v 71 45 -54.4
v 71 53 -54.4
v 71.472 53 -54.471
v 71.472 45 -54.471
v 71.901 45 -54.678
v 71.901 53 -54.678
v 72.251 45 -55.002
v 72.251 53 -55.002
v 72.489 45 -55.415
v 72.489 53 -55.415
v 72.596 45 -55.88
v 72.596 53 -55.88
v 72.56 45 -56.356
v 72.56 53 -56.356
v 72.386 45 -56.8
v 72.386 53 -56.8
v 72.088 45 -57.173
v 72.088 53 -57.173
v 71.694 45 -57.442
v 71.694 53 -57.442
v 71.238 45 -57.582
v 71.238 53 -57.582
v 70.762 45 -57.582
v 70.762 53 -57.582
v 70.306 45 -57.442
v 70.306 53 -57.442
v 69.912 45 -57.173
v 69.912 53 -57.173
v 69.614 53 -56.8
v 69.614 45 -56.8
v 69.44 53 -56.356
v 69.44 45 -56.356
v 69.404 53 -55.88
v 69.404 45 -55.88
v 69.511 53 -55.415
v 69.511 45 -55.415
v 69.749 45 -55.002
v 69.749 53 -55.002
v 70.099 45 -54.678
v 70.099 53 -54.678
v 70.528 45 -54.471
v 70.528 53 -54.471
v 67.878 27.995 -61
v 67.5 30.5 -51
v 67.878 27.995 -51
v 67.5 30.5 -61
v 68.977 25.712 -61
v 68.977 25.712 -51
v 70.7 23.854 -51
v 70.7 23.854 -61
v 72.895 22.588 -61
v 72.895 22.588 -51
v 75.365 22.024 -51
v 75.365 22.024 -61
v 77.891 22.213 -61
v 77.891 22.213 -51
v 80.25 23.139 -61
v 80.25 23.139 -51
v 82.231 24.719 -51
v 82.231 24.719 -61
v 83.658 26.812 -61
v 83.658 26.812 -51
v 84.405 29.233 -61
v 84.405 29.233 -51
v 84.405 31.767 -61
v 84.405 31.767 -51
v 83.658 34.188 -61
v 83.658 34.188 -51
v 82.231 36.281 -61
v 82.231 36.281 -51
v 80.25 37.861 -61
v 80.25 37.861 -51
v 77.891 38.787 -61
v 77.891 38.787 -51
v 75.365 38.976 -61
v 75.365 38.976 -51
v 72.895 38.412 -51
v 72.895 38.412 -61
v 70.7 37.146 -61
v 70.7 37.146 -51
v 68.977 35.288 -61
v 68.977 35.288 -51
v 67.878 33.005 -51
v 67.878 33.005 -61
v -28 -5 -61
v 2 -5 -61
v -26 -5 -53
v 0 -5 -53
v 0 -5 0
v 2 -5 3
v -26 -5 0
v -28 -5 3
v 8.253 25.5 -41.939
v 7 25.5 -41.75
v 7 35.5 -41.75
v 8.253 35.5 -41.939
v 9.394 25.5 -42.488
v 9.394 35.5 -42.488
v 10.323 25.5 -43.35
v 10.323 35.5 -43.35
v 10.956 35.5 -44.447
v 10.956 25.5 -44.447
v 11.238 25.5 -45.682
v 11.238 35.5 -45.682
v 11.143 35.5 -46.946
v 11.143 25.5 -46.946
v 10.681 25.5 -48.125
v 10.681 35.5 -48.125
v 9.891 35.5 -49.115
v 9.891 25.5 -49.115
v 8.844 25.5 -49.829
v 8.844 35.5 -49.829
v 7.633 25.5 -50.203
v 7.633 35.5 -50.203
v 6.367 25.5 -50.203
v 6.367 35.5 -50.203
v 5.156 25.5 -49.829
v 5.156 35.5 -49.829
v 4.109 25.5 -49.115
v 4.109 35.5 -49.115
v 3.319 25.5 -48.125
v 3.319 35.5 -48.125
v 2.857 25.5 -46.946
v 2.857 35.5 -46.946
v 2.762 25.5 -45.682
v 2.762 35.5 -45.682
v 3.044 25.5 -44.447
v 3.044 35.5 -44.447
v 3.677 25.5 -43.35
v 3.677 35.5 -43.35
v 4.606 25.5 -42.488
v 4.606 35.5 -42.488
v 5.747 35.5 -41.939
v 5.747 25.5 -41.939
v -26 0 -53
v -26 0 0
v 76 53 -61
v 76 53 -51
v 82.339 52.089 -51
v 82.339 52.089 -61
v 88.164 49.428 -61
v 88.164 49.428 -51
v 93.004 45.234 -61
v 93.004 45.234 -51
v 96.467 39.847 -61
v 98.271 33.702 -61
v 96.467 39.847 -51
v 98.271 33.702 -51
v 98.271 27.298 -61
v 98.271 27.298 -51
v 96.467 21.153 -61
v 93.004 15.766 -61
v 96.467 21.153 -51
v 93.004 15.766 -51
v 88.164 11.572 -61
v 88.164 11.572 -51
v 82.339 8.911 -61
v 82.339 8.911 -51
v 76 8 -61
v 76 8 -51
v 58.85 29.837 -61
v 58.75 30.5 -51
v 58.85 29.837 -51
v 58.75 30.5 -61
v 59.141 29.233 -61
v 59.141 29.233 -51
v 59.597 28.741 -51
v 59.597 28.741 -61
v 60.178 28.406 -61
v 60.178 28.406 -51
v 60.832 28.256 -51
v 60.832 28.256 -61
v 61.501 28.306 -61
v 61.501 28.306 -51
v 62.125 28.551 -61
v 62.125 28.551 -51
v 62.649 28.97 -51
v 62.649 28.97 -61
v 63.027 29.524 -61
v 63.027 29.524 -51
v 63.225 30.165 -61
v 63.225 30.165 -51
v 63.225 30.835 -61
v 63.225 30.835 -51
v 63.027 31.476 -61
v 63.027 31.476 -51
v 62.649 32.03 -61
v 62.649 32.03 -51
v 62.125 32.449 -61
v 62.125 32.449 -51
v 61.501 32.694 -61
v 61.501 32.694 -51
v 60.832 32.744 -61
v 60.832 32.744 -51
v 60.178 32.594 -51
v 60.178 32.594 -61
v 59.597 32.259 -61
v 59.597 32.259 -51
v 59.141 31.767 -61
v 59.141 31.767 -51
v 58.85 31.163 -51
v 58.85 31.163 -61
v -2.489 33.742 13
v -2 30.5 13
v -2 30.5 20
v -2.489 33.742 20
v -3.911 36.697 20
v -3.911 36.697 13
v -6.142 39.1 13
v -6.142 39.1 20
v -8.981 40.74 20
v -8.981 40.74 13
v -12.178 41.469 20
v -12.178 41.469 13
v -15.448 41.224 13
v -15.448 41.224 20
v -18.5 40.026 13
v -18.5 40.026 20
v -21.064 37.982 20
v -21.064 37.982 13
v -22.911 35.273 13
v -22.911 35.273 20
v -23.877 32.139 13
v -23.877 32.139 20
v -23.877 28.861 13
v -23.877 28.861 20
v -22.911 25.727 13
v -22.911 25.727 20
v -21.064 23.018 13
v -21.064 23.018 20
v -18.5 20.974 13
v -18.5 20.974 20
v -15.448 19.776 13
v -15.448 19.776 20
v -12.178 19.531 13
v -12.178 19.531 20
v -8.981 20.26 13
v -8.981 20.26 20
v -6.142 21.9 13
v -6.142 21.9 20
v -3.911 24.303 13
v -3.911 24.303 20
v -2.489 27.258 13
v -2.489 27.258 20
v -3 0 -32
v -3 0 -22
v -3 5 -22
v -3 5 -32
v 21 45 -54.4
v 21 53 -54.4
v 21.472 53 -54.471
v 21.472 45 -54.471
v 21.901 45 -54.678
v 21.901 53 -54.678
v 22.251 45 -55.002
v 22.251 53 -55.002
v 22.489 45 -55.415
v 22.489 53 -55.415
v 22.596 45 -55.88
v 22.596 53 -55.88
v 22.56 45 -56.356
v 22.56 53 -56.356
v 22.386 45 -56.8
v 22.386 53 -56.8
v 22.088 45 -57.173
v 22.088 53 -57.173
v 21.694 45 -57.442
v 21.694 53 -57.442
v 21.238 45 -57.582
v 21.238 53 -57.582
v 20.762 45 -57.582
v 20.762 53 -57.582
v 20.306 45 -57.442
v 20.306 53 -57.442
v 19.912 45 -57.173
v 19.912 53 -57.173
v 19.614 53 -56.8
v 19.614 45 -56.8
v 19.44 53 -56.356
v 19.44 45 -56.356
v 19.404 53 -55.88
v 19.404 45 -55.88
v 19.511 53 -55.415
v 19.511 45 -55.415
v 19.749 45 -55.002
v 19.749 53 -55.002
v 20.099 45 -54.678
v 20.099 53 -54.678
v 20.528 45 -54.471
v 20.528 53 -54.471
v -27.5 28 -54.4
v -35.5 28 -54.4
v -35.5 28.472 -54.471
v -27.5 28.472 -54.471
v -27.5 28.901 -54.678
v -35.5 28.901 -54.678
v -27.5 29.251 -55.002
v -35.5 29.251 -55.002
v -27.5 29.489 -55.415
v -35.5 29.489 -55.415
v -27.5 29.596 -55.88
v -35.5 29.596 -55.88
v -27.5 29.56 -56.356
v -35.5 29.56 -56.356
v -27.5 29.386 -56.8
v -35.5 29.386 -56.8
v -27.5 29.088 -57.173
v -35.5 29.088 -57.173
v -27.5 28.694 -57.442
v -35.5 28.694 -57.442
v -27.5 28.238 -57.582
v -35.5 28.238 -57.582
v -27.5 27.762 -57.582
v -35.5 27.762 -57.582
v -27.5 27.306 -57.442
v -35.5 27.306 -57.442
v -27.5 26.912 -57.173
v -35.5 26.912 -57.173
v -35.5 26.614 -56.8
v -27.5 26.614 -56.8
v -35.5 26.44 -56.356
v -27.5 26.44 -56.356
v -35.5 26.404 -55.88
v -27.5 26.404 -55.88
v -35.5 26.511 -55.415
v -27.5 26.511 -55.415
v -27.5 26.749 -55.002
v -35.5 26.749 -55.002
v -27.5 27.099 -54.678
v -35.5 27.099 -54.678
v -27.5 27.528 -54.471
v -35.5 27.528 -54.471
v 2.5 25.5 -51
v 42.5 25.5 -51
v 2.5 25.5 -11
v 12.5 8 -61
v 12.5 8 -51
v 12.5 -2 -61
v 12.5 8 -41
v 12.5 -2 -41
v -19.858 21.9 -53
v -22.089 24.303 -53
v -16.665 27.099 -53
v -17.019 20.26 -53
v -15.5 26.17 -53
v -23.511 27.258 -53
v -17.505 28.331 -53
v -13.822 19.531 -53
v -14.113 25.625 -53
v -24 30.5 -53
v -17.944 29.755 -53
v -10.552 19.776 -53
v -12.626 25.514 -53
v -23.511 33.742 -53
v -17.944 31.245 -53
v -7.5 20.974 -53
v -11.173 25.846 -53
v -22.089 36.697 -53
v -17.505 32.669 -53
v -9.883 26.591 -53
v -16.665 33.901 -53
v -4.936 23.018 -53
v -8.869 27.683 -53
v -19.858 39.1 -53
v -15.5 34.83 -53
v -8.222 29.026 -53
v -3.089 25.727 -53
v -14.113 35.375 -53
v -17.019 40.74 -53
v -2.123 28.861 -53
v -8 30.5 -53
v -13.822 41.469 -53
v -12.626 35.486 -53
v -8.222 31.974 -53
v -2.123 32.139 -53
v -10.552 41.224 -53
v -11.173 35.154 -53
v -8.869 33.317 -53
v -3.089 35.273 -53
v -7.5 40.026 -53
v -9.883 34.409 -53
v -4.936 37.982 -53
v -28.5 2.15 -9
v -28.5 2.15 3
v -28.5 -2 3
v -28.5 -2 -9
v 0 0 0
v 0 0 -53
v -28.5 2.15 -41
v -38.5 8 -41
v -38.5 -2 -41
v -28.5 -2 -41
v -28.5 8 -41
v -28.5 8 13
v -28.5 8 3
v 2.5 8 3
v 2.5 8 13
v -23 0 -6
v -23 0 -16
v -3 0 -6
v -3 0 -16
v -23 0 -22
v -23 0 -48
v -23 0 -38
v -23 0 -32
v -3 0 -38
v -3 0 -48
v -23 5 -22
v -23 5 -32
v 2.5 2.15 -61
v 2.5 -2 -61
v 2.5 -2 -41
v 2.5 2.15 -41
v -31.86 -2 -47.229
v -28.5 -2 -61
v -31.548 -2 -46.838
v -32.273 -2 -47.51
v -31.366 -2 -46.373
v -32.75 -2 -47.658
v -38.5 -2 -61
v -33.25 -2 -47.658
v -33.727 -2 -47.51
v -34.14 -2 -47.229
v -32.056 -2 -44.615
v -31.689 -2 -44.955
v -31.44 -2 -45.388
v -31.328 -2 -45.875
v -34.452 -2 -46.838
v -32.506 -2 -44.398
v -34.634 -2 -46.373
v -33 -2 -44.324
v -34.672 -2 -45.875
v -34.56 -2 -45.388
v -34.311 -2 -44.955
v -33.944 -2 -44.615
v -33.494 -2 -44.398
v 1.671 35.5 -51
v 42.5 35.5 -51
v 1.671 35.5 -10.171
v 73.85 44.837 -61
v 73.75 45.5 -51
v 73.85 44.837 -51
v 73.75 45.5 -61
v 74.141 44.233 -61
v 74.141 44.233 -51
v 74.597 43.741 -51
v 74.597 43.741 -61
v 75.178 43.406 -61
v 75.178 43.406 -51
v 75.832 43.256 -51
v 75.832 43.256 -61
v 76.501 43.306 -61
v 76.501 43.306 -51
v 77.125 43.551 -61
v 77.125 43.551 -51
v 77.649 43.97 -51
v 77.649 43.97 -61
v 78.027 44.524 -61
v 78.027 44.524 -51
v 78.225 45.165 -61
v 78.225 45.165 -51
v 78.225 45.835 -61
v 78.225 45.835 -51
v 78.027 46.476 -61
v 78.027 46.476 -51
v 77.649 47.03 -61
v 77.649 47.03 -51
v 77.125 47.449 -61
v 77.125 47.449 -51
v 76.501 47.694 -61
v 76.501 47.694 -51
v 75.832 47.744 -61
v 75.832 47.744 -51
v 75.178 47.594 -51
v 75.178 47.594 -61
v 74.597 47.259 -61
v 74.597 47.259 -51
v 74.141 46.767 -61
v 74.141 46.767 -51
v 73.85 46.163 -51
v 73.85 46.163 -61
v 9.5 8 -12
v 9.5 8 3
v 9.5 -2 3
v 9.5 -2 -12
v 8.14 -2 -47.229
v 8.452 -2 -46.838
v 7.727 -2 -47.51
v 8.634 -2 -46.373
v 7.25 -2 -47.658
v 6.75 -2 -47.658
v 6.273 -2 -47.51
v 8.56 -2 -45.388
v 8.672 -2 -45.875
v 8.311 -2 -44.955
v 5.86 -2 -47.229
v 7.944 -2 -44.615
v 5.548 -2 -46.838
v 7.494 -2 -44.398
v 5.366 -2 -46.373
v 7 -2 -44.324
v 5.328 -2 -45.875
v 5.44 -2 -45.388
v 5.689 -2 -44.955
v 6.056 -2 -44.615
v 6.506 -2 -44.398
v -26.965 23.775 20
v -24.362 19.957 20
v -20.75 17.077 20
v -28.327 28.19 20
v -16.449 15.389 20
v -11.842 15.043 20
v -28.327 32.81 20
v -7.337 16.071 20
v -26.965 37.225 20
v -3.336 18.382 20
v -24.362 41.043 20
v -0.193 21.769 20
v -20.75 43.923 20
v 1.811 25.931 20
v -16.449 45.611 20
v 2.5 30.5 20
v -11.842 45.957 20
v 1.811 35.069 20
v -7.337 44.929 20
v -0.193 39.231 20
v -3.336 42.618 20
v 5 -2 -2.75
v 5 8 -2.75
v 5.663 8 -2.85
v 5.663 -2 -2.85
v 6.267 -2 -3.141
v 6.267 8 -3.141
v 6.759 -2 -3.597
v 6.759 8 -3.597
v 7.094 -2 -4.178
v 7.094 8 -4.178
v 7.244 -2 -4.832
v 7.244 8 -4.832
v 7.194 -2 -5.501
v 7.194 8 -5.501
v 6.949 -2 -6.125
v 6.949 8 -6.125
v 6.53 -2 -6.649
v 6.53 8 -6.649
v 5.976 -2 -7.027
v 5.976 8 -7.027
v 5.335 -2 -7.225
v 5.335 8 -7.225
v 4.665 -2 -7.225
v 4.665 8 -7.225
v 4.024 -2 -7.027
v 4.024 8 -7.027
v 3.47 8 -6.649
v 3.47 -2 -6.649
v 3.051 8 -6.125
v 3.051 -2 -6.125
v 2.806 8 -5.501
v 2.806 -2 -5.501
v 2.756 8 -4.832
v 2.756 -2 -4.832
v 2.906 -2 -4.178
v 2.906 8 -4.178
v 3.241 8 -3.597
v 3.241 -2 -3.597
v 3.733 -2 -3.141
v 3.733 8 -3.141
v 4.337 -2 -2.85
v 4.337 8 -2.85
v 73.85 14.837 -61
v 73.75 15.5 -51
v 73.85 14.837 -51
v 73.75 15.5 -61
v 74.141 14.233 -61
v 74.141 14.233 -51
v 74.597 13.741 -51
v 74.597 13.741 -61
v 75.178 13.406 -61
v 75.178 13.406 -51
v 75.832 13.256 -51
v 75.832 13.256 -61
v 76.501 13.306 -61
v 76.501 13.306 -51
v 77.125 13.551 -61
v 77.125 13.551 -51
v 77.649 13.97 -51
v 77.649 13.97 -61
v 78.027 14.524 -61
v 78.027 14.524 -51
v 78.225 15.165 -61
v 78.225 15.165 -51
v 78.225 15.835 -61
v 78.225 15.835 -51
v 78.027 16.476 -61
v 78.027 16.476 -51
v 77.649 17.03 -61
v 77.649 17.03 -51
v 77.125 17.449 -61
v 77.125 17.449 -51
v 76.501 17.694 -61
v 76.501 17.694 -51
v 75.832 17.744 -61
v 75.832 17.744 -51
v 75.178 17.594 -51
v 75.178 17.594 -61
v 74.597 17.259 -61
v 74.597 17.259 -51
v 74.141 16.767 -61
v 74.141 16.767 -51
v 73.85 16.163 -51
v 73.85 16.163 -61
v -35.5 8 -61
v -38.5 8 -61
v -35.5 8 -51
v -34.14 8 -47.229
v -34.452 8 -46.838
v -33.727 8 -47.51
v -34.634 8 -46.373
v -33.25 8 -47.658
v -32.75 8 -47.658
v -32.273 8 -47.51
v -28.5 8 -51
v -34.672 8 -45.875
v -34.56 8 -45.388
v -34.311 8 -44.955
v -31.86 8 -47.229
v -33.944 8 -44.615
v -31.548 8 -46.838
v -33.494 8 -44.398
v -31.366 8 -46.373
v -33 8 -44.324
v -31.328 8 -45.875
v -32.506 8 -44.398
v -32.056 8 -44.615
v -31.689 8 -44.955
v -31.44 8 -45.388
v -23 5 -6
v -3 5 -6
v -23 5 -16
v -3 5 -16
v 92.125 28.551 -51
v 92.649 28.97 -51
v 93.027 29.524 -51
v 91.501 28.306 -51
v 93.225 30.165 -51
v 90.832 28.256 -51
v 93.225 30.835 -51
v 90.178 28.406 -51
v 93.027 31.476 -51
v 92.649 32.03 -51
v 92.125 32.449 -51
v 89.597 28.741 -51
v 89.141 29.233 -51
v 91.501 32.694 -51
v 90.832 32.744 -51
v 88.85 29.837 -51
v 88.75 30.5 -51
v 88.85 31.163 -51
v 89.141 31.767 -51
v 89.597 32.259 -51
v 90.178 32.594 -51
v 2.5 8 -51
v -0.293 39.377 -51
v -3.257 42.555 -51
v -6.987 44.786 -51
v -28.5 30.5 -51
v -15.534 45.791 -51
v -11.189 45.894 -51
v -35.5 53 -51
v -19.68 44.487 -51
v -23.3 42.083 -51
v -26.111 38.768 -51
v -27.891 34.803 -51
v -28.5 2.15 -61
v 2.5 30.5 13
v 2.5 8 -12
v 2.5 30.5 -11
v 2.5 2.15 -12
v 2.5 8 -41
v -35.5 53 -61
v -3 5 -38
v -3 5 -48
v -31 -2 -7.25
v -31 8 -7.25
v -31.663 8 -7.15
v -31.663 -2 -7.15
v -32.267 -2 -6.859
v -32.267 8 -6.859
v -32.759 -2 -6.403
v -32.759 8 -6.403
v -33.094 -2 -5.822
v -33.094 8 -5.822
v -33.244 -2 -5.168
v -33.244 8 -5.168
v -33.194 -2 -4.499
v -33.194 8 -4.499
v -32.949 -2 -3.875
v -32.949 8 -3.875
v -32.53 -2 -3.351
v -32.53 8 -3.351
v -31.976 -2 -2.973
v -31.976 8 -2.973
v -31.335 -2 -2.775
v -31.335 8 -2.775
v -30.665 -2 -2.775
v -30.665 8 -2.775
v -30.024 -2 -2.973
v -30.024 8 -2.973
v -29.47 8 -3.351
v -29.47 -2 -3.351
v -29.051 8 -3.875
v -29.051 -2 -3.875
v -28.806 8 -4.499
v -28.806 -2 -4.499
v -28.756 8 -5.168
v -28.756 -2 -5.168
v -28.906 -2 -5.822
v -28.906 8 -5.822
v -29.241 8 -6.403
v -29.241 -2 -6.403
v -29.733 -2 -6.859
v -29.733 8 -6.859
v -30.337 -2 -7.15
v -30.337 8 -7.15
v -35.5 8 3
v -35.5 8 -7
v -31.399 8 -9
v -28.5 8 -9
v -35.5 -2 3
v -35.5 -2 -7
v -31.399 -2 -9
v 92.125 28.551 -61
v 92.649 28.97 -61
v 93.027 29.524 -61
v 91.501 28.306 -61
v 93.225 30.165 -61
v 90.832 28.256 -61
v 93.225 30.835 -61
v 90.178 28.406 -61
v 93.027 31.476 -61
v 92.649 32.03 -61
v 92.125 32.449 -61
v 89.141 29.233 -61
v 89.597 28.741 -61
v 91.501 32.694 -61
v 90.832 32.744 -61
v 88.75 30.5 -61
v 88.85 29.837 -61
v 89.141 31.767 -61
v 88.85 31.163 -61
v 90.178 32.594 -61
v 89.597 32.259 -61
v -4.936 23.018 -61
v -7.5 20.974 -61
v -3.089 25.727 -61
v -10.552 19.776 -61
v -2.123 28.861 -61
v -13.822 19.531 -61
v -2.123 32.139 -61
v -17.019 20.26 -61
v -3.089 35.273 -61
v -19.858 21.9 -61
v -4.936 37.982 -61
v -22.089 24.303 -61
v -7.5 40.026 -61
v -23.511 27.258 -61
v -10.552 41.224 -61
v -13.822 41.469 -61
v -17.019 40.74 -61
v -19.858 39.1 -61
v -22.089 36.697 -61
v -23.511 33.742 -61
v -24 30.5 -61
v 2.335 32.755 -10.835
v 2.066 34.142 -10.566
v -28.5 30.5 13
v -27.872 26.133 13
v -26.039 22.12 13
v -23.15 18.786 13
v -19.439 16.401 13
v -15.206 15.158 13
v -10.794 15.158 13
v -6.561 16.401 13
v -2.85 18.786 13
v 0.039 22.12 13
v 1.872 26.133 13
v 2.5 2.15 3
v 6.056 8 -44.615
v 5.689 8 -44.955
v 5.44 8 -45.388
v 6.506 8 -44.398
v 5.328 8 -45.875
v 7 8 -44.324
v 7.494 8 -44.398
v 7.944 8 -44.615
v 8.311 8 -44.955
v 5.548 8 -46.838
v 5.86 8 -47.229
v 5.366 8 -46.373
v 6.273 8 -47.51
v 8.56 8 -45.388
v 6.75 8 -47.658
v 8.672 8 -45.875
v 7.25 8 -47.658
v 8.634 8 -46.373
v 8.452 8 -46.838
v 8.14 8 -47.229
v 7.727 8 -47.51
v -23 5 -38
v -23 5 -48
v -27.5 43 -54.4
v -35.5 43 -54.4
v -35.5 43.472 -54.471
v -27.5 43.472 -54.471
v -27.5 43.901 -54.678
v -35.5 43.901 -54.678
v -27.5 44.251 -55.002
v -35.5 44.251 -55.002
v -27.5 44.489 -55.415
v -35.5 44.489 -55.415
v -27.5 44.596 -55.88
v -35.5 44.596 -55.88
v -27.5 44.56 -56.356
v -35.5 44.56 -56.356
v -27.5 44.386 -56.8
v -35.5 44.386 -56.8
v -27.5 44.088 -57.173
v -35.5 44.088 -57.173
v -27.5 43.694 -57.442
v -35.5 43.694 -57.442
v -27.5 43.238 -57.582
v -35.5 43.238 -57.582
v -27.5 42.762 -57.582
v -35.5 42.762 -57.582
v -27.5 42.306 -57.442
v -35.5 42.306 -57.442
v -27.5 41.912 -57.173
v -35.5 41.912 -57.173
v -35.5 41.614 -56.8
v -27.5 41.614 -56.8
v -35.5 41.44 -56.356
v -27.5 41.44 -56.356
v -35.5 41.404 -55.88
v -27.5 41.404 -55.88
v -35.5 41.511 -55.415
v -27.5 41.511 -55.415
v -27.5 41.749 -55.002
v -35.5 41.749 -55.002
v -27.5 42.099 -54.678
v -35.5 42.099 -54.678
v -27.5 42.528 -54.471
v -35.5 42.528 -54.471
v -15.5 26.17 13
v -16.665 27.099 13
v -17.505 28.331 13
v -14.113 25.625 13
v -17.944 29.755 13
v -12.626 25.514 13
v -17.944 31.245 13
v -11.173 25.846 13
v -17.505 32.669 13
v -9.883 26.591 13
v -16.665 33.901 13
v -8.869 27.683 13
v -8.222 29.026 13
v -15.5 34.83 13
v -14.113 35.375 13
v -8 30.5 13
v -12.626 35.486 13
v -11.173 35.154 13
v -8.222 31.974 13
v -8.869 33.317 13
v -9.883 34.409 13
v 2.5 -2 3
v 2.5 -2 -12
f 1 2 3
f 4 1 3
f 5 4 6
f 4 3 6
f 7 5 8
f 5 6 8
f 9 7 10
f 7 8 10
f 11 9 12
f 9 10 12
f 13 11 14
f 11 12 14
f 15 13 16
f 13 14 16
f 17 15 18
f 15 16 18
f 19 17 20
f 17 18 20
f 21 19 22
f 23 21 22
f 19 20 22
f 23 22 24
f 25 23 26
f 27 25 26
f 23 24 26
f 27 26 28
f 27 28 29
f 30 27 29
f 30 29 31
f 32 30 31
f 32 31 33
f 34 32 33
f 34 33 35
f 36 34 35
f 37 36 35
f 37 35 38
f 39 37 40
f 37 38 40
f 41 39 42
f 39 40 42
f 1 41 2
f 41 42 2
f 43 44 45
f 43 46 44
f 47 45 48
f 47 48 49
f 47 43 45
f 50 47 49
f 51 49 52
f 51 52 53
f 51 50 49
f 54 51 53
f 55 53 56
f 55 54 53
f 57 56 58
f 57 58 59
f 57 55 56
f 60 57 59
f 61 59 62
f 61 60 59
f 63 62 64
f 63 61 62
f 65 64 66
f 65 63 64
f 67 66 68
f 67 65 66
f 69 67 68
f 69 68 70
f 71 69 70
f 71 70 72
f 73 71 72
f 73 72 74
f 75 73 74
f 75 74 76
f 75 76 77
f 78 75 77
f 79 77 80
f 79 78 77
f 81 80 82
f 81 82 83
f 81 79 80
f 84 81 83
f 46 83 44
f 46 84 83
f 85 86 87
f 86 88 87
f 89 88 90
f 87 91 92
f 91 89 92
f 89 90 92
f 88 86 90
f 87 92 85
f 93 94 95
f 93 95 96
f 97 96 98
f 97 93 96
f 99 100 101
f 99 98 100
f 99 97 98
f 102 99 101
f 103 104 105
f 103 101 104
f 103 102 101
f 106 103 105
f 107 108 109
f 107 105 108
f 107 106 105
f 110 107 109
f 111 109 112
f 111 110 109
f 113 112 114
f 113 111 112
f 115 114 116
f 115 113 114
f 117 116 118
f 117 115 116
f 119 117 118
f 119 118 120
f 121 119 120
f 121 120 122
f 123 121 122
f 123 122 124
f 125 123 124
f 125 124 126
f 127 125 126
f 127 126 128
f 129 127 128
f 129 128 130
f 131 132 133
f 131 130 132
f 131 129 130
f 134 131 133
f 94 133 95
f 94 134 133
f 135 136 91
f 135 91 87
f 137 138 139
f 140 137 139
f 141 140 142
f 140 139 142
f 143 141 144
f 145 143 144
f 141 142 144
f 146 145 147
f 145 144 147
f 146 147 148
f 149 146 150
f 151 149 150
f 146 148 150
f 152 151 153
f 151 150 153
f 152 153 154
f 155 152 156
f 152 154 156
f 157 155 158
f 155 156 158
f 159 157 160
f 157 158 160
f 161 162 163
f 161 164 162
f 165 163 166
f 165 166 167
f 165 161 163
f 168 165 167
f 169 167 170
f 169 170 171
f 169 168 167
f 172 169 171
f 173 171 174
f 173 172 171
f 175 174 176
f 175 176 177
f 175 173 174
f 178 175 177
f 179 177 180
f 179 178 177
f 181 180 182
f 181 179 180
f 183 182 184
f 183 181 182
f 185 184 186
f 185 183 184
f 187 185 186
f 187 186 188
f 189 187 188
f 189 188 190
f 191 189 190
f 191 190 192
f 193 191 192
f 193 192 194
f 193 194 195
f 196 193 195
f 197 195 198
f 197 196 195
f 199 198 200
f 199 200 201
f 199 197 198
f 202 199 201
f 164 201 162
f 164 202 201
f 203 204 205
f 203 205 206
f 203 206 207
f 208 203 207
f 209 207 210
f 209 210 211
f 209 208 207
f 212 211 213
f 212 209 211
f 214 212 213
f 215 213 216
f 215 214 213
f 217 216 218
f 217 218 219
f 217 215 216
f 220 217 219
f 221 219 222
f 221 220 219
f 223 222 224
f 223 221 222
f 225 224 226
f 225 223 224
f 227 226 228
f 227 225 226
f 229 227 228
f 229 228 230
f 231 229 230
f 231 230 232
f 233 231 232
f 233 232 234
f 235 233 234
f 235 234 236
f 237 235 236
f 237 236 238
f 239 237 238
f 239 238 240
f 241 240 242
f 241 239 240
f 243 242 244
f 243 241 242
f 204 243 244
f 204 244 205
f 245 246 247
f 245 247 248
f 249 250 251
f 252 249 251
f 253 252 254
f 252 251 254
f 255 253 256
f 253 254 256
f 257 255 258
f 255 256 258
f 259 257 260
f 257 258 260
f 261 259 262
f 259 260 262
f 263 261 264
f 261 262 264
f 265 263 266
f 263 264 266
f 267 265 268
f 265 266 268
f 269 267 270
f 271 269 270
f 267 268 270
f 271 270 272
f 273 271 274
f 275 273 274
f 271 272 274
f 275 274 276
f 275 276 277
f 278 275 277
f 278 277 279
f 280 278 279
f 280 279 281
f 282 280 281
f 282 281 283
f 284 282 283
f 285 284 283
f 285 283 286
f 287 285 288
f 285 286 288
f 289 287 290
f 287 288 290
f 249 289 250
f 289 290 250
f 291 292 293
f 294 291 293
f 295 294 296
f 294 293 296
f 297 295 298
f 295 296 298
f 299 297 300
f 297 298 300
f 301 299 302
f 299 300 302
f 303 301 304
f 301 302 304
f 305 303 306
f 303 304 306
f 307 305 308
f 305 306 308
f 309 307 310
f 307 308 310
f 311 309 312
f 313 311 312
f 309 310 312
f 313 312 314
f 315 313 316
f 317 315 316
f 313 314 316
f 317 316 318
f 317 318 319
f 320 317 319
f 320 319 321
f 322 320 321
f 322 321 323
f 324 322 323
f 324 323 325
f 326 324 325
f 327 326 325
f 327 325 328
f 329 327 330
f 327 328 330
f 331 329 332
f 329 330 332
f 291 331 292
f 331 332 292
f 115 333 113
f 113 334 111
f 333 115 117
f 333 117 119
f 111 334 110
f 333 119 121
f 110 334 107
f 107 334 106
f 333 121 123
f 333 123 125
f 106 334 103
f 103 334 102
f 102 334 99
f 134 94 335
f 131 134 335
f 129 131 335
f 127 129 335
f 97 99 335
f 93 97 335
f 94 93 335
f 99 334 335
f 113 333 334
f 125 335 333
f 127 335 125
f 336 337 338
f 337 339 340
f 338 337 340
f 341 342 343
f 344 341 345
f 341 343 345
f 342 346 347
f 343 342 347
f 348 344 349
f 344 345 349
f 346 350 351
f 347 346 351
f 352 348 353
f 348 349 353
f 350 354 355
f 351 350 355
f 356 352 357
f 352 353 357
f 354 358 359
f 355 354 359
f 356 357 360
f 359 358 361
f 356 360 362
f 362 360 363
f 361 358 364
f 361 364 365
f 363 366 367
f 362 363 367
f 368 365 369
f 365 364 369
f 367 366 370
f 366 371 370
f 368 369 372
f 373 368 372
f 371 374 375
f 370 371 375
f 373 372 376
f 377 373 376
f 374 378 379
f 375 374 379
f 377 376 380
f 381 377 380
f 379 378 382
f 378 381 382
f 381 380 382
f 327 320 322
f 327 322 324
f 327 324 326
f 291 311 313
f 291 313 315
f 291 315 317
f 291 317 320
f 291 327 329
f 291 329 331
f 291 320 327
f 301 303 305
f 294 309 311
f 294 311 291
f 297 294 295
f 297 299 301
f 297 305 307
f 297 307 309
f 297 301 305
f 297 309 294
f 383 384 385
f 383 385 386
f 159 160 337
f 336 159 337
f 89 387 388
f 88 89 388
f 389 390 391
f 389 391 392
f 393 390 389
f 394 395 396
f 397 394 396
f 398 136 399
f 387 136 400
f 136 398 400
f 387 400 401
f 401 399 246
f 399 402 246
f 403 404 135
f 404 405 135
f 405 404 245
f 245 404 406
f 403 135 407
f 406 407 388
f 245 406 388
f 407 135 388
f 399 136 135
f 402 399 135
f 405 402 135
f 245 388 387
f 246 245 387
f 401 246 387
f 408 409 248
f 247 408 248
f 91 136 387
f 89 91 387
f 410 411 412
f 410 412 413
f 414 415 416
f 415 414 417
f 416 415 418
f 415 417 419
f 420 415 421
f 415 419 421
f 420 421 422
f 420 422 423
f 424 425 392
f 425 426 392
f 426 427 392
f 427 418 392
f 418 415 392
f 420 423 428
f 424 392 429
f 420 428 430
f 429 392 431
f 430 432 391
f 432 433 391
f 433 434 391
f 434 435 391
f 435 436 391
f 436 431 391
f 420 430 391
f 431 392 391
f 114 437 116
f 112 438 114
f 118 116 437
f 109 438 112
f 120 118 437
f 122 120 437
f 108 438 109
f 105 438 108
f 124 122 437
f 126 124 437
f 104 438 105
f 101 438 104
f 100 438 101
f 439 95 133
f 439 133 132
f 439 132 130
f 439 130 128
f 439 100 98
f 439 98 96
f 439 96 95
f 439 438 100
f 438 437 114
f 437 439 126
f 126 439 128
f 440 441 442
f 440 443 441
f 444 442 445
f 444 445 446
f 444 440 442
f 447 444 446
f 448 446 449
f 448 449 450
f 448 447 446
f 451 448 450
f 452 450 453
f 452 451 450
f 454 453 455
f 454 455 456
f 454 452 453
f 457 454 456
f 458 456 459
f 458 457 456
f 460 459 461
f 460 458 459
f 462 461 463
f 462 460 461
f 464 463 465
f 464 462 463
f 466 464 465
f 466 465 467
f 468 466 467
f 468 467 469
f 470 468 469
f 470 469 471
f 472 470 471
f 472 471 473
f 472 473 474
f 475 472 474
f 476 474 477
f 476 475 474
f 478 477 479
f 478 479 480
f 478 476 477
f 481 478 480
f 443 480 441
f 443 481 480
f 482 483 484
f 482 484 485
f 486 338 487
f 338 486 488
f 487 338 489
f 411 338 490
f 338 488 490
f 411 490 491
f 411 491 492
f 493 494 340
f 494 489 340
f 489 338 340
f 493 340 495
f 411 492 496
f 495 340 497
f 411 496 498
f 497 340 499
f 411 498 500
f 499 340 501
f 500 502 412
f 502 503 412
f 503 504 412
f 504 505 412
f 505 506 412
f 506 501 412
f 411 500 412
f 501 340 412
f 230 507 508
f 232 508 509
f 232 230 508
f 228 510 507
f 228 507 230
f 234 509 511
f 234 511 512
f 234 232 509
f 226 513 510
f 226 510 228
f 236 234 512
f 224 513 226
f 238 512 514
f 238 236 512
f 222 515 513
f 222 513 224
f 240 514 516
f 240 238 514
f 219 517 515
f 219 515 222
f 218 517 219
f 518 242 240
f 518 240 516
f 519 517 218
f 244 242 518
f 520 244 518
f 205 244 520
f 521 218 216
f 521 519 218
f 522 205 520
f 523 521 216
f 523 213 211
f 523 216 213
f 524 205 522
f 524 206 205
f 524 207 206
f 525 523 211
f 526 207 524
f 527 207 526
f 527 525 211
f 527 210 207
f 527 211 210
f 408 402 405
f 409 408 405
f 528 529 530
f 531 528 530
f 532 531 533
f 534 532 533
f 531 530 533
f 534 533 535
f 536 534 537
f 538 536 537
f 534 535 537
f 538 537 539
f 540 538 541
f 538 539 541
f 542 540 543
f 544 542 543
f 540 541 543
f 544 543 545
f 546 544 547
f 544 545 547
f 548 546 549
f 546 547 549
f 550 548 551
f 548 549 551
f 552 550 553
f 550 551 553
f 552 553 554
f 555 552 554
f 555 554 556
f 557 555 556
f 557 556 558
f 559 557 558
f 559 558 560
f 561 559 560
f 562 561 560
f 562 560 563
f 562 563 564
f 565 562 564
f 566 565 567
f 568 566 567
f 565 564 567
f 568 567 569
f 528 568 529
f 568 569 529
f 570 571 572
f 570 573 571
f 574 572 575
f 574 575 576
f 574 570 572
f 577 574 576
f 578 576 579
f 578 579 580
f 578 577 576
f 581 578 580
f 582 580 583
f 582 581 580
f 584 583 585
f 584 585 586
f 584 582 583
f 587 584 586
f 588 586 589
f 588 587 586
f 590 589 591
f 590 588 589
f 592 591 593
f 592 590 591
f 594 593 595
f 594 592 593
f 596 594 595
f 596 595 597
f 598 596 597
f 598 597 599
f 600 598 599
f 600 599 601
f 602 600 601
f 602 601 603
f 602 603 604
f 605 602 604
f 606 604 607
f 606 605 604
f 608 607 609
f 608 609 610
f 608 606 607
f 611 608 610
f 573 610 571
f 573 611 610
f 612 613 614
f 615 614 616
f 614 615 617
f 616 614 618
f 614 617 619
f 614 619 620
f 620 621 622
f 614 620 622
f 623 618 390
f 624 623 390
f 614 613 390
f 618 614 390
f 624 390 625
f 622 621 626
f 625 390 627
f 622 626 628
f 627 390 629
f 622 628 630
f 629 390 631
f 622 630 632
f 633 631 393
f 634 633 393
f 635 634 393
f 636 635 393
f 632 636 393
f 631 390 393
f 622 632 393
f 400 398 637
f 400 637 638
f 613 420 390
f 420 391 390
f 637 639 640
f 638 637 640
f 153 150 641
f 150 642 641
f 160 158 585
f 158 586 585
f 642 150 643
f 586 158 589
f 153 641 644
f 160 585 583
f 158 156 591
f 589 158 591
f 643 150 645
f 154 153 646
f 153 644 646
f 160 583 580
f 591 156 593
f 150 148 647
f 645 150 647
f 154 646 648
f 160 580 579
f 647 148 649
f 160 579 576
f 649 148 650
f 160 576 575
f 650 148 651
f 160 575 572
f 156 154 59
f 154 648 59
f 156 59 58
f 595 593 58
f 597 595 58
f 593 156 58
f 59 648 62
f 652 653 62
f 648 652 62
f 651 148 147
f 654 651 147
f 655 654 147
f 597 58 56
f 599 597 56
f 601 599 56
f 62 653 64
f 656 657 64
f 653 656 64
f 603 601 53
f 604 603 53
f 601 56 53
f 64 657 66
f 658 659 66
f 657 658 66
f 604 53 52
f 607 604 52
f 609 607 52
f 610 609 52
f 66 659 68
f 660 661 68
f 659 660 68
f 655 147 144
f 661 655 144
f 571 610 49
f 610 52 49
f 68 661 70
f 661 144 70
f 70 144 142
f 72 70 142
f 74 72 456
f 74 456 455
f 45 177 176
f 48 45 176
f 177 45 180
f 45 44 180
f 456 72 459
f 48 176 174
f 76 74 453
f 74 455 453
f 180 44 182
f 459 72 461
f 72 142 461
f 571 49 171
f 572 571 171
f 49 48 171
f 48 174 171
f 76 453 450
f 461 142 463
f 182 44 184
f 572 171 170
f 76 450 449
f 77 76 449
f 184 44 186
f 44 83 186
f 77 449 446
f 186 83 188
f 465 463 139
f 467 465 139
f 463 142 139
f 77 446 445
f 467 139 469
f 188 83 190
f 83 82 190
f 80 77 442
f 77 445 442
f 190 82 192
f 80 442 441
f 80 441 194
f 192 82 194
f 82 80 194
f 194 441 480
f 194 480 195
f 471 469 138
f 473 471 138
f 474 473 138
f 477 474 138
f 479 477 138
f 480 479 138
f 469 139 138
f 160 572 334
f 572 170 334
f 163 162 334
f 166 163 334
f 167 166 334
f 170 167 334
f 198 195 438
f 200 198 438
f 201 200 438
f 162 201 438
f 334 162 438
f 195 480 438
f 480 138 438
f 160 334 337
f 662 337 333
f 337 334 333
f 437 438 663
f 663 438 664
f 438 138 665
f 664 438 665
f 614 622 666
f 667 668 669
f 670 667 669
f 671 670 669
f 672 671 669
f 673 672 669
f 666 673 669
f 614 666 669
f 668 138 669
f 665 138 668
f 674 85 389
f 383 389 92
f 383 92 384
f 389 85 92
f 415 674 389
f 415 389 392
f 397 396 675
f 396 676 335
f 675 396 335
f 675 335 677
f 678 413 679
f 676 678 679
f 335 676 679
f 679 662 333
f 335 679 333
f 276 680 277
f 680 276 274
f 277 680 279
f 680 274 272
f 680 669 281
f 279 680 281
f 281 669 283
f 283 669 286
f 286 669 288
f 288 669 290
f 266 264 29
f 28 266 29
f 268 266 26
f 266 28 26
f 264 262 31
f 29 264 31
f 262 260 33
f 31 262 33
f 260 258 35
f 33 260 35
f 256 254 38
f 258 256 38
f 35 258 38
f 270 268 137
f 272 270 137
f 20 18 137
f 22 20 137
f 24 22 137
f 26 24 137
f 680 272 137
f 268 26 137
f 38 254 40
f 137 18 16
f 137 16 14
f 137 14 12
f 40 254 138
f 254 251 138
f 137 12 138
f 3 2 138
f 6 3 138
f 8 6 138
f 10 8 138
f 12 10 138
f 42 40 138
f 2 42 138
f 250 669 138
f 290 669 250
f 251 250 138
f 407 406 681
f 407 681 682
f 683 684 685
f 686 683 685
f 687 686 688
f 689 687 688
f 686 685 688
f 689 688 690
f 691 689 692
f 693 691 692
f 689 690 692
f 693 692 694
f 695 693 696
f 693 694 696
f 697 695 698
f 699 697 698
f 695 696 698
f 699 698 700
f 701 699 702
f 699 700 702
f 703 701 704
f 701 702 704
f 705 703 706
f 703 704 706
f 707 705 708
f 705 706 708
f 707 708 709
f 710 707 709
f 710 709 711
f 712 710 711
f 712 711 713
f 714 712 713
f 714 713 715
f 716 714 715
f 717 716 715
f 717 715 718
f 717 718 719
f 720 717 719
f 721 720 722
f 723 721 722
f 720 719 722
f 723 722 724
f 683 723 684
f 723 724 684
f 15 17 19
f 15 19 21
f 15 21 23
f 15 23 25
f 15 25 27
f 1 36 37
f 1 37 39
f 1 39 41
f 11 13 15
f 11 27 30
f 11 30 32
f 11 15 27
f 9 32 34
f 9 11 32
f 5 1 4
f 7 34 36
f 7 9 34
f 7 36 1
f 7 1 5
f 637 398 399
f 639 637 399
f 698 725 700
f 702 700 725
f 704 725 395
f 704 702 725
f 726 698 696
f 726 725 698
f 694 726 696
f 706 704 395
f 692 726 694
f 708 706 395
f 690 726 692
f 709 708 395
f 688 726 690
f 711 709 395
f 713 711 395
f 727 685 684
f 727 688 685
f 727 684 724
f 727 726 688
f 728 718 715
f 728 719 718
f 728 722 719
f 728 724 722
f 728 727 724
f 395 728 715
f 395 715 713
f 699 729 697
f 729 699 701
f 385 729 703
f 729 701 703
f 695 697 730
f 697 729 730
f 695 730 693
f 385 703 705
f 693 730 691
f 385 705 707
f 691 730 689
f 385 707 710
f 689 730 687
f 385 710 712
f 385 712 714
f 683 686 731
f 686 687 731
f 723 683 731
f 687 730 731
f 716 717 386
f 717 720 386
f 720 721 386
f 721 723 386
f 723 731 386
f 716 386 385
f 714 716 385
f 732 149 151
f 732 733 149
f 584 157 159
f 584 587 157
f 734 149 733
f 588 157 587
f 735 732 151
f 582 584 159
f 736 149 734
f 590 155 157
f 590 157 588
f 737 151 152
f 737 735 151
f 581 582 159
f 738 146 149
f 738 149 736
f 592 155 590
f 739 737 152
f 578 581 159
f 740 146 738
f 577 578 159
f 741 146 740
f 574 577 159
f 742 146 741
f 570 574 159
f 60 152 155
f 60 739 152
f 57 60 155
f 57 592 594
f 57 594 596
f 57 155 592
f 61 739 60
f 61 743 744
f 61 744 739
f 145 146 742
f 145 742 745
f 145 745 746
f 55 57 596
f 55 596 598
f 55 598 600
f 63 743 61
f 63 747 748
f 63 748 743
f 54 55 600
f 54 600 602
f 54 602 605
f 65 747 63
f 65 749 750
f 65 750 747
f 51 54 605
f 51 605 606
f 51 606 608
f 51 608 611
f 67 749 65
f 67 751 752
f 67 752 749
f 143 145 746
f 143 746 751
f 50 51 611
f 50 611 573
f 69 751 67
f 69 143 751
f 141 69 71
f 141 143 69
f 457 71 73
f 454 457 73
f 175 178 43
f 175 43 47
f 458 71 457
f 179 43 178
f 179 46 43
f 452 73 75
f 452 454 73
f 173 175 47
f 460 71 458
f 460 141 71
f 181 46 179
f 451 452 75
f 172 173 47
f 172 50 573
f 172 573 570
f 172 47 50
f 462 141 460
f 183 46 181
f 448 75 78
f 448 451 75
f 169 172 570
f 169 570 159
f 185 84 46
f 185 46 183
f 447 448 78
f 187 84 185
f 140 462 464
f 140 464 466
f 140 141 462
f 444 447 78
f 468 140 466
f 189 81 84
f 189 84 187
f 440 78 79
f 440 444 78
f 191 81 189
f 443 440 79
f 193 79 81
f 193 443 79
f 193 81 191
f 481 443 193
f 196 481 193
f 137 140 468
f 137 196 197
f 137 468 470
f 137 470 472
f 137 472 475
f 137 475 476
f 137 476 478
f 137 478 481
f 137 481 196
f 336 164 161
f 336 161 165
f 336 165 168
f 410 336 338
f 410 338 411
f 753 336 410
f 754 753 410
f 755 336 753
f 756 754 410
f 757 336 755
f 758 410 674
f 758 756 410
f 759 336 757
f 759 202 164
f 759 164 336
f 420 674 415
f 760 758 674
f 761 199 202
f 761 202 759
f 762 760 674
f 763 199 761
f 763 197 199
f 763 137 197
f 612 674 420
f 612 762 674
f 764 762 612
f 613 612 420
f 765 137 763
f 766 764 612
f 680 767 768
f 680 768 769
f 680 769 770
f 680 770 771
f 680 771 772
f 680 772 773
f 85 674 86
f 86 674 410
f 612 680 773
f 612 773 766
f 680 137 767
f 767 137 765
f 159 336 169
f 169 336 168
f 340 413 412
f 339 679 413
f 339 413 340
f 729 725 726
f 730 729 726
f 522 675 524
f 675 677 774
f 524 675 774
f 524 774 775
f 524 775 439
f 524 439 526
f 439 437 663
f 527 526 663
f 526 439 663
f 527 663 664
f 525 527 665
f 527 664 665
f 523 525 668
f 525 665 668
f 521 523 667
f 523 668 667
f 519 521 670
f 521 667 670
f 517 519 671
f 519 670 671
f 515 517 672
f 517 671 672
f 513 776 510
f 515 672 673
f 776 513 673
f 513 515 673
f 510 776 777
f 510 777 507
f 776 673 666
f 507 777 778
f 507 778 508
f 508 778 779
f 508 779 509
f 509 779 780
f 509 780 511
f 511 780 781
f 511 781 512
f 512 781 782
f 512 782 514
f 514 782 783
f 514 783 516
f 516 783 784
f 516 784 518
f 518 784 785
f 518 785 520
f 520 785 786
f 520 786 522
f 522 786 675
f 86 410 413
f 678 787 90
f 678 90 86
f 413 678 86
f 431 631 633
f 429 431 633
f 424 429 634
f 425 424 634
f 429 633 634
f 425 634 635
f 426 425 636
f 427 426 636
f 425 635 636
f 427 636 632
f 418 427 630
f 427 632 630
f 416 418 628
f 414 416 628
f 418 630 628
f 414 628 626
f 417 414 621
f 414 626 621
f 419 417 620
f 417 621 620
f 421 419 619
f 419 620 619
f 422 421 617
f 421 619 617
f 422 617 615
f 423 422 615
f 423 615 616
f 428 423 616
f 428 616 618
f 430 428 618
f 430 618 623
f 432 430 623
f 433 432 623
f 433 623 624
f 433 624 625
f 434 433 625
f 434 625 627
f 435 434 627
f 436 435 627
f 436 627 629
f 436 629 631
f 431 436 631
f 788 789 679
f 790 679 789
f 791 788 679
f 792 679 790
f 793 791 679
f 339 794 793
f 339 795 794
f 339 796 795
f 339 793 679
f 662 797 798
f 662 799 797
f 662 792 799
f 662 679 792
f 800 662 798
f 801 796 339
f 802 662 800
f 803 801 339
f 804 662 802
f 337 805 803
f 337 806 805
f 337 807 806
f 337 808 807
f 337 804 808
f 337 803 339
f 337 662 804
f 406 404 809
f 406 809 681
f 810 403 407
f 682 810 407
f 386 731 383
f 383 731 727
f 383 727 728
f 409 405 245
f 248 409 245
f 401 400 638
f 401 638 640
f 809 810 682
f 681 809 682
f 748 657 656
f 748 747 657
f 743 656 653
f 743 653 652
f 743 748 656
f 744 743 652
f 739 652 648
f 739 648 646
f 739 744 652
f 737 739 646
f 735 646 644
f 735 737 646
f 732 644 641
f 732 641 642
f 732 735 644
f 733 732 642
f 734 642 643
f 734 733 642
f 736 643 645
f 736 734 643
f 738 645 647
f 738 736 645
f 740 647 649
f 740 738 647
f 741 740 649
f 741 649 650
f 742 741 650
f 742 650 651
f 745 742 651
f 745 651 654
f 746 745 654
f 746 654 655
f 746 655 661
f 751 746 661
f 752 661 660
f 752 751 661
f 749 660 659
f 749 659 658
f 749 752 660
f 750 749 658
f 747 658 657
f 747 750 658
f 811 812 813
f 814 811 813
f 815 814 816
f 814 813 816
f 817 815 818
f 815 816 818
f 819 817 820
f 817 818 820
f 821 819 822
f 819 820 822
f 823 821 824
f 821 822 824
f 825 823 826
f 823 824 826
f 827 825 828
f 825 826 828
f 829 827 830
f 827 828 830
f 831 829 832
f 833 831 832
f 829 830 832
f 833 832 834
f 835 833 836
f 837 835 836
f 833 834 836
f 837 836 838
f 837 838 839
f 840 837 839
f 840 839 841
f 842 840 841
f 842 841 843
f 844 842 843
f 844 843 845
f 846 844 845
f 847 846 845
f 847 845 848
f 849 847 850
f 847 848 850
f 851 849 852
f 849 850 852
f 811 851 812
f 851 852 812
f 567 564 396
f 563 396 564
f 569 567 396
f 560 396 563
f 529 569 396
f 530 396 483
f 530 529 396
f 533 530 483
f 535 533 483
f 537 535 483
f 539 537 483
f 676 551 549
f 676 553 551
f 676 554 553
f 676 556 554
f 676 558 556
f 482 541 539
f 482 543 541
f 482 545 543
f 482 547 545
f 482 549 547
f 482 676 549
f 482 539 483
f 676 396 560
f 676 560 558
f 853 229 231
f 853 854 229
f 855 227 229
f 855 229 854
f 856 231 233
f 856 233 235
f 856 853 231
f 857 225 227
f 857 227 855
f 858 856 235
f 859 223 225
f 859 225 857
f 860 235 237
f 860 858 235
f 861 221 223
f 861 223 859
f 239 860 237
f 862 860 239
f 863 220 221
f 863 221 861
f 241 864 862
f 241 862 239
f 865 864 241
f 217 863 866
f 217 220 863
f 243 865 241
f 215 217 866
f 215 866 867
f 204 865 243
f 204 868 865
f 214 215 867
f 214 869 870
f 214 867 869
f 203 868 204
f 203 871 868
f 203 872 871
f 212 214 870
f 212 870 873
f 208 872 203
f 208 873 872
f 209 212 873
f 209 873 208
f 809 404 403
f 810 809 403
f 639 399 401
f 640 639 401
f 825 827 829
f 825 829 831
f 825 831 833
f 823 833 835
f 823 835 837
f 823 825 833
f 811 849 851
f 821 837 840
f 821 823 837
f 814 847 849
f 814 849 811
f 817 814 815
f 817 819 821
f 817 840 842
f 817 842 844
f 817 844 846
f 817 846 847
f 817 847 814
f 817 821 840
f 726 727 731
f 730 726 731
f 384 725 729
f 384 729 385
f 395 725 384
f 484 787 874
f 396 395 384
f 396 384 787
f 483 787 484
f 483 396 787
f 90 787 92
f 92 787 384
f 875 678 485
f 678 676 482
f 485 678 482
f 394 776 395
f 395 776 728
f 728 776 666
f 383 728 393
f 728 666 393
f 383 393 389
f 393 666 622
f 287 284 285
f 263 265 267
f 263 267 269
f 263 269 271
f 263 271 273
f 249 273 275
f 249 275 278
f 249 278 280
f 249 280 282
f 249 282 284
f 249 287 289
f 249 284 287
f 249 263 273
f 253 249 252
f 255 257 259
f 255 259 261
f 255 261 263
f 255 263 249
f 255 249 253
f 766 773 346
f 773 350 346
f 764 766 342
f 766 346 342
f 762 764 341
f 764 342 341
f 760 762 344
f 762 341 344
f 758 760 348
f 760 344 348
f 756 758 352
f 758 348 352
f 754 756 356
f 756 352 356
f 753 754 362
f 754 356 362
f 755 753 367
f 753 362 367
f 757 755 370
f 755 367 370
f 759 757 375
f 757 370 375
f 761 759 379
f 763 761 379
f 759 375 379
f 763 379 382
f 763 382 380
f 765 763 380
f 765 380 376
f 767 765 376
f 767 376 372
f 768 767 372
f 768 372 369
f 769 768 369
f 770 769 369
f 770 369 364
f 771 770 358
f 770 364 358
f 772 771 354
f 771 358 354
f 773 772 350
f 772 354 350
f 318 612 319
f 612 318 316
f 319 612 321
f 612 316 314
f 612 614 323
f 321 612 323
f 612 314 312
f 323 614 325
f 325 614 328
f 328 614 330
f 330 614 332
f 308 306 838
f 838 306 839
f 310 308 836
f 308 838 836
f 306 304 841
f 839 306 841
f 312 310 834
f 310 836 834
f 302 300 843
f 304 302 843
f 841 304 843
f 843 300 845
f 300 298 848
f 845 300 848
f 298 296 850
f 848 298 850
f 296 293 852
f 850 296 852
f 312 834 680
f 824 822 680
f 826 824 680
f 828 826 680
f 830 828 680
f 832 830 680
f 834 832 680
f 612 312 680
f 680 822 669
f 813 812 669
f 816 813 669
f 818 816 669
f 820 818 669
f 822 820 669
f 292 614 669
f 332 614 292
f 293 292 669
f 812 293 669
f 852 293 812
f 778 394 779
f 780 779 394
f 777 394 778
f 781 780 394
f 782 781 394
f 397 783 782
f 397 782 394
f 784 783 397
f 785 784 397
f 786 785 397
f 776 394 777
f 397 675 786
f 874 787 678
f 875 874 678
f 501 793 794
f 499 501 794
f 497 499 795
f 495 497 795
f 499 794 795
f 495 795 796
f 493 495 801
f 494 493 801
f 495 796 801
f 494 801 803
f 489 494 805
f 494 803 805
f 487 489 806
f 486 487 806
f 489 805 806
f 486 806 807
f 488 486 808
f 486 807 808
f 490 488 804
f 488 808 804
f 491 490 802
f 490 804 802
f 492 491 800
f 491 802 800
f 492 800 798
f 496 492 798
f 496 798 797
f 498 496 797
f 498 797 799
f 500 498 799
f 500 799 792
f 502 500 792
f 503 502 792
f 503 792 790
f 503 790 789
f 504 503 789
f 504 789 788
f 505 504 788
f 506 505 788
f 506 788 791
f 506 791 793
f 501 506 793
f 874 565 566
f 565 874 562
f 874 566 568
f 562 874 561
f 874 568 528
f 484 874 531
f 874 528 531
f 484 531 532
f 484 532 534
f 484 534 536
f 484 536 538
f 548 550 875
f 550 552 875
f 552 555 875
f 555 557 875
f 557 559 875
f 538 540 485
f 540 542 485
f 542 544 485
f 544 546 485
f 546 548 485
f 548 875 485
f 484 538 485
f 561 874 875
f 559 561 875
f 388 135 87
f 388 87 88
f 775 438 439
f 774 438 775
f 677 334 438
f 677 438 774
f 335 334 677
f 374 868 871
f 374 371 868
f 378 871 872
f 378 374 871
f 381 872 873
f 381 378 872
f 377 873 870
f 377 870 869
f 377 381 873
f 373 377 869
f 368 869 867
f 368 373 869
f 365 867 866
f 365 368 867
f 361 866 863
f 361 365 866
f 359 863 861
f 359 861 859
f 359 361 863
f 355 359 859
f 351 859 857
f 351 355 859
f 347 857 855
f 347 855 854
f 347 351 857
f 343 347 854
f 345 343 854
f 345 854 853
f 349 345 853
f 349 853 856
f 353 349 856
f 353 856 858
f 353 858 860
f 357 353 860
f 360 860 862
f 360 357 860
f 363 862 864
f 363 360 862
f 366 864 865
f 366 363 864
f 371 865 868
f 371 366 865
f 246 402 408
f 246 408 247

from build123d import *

# Parameters (mm, degrees)
SKETCH1_W                = 26
SKETCH1_H                = 53
SKETCH1_W_2              = 20
SKETCH1_H_2              = 10
BOSS_EXTRUDE1_DEPTH      = 5
SKETCH2_W                = 31
SKETCH2_H                = 59
SKETCH2_W_2              = 26
SKETCH2_H_2              = 53
BOSS_EXTRUDE2_DEPTH      = 10
SKETCH3_W                = 31
SKETCH3_H                = 59
BOSS_EXTRUDE3_DEPTH      = 3
CHAMFER1_SIZE            = 0.5
CHAMFER1_SIZE2           = 7.150333128
SKETCH10_W               = 7
SKETCH10_H               = 15
SKETCH10_R               = 2.25
BOSS_EXTRUDE7_DEPTH      = 10
SKETCH11_W               = 7
SKETCH11_H               = 3
CUT_EXTRUDE4_DEPTH       = 10
CHAMFER2_SIZE            = 2
CHAMFER2_SIZE2           = 4.100607683
BOSS_EXTRUDE8_REACH      = 69.567
SKETCH12_W               = 10
SKETCH12_H               = 15
SKETCH12_R               = 1.676379865
BOSS_EXTRUDE9_START      = -56
SKETCH15_R               = 8.5
SKETCH15_R_2             = 2.25
SKETCH15_R_3             = 11
BOSS_EXTRUDE9_DEPTH      = 5
BOSS_EXTRUDE9_DEPTH_BACK = 5
SKETCH16_R               = 2.25
SKETCH16_R_2             = 8.5
SKETCH16_R_3             = 5
BOSS_EXTRUDE10_DEPTH     = 2
SKETCH17_R               = 5
BOSS_EXTRUDE11_DEPTH     = 64
RIB2_REACH               = 123.175
SKETCH20_WALL_W          = 300.919527638
SKETCH20_WALL_H          = 10
BOSS_EXTRUDE12_DEPTH     = 5
SKETCH22_R               = 15.5
SKETCH22_R_2             = 11
BOSS_EXTRUDE13_DEPTH     = 7
SKETCH23_R               = 4.25
CUT_EXTRUDE5_DEPTH       = 29
SKETCH24_R               = 1.6
CUT_EXTRUDE6_DEPTH       = 8
SKETCH25_R               = 1.6
CUT_EXTRUDE7_DEPTH       = 8


with BuildPart() as part:
    # Sketch1 → Boss-Extrude1 (new body)
    with BuildSketch(Plane(origin=(0, 0, 0), x_dir=(1, 0, 0), z_dir=(0, 1, 0))):
        with Locations((-13, 26.5)):
            Rectangle(SKETCH1_W, SKETCH1_H)
        with Locations((-13, 27)):
            Rectangle(SKETCH1_W_2, SKETCH1_H_2, mode=Mode.SUBTRACT)
        with Locations((-13, 43)):
            Rectangle(SKETCH1_W_2, SKETCH1_H_2, mode=Mode.SUBTRACT)
        with Locations((-13, 11)):
            Rectangle(SKETCH1_W_2, SKETCH1_H_2, mode=Mode.SUBTRACT)
    extrude(amount=BOSS_EXTRUDE1_DEPTH)

    # Sketch2 → Boss-Extrude2 (add)
    with BuildSketch(Plane(origin=(0, 5, 0), x_dir=(1, 0, 0), z_dir=(0, 1, 0))):
        with Locations((-13, 26.5)):
            Rectangle(SKETCH2_W, SKETCH2_H)
        with Locations((-13, 26.5)):
            Rectangle(SKETCH2_W_2, SKETCH2_H_2, mode=Mode.SUBTRACT)
    extrude(amount=-BOSS_EXTRUDE2_DEPTH)

    # Sketch3 → Boss-Extrude3 (add)
    with BuildSketch(Plane(origin=(0, 5, 0), x_dir=(1, 0, 0), z_dir=(0, 1, 0))):
        with Locations((-13, 26.5)):
            Rectangle(SKETCH3_W, SKETCH3_H)
    extrude(amount=BOSS_EXTRUDE3_DEPTH)

    # Chamfer1
    chamfer1_edges = [part.edges().sort_by_distance(p)[0] for p in [
        (-28.5, -5, -26.5),
        (2.5, -5, -26.5),
    ]]
    chamfer1_side = [part.faces().sort_by_distance(p)[0] for p in [
        (-13, -5, -55.333516692),
    ]]
    chamfer(chamfer1_edges, length=CHAMFER1_SIZE, length2=CHAMFER1_SIZE2, reference=chamfer1_side[0])

    # Sketch10 → Boss-Extrude7 (add)
    with BuildSketch(Plane(origin=(0, 8, 0), x_dir=(1, 0, 0), z_dir=(0, 1, 0))):
        with Locations((6, 4.5)):
            Rectangle(SKETCH10_W, SKETCH10_H)
        with Locations(Location((5, 5, 0), (0, 0, 270))):
            Circle(SKETCH10_R, mode=Mode.SUBTRACT)
        with Locations((-32, 4.5)):
            Rectangle(SKETCH10_W, SKETCH10_H)
        with Locations(Location((-31, 5, 0), (0, 0, 90))):
            Circle(SKETCH10_R, mode=Mode.SUBTRACT)
    extrude(amount=-BOSS_EXTRUDE7_DEPTH)

    # Sketch11 → Cut-Extrude4 (cut)
    with BuildSketch(Plane(origin=(0, 8, 0), x_dir=(1, 0, 0), z_dir=(0, 1, 0))):
        with Locations((-32, 10.5)):
            Rectangle(SKETCH11_W, SKETCH11_H)
    extrude(amount=-CUT_EXTRUDE4_DEPTH, mode=Mode.SUBTRACT)

    # Chamfer2
    chamfer2_edges = [part.edges().sort_by_distance(p)[0] for p in [
        (-35.5, 3, -9),
    ]]
    chamfer2_side = [part.faces().sort_by_distance(p)[0] for p in [
        (-35.5, 3, -3),
    ]]
    chamfer(chamfer2_edges, length=CHAMFER2_SIZE, length2=CHAMFER2_SIZE2, reference=chamfer2_side[0])

    # Boss-Extrude8: up to this face of the body (flat: up to its plane)
    boss_extrude8_end = Plane(part.part.faces().sort_by_distance((6, -2, 2.834470546))[0])
    # Sketch12 → Boss-Extrude8 (add, up to the picked face)
    with BuildSketch(Plane(origin=(0, 8, 0), x_dir=(1, 0, 0), z_dir=(0, 1, 0)), mode=Mode.PRIVATE) as boss_extrude8_sk1:
        with Locations((7.5, 48.5)):
            Rectangle(SKETCH12_W, SKETCH12_H)
        with Locations(Location((7, 46, 0), (0, 0, 270))):
            Circle(SKETCH12_R, mode=Mode.SUBTRACT)
    boss_extrude8_tool1 = split(extrude(boss_extrude8_sk1.sketch, amount=-BOSS_EXTRUDE8_REACH, mode=Mode.PRIVATE), bisect_by=boss_extrude8_end, keep=Keep.BOTH, mode=Mode.PRIVATE)
    # Sketch12 → Boss-Extrude8 (add, up to the picked face)
    with BuildSketch(Plane(origin=(0, 8, 0), x_dir=(1, 0, 0), z_dir=(0, 1, 0)), mode=Mode.PRIVATE) as boss_extrude8_sk2:
        with Locations((-33.5, 48.5)):
            Rectangle(SKETCH12_W, SKETCH12_H)
        with Locations(Location((-33, 46, 0), (0, 0, 270))):
            Circle(SKETCH12_R, mode=Mode.SUBTRACT)
    boss_extrude8_tool2 = split(extrude(boss_extrude8_sk2.sketch, amount=-BOSS_EXTRUDE8_REACH, mode=Mode.PRIVATE), bisect_by=boss_extrude8_end, keep=Keep.BOTH, mode=Mode.PRIVATE)
    add(boss_extrude8_tool1.solids().sort_by(Axis((7.531269, 8, -48.656347), (0, -1, 0)))[0])
    add(boss_extrude8_tool2.solids().sort_by(Axis((-33.531269, 8, -48.656347), (0, -1, 0)))[0])

    # Sketch15 → Boss-Extrude9 (add, two sides)
    with BuildSketch(Plane.XY.offset(BOSS_EXTRUDE9_START)) as boss_extrude9_sk:
        with BuildLine():
            Line((-13, 53), (76, 53))
            ThreePointArc((76, 53), (98.5, 30.5), (76, 8))
            Line((76, 8), (-13, 8))
            Line((-13, 8), (-35.5, 8))
            Line((-35.5, 8), (-35.5, 53))
            Line((-35.5, 53), (-13, 53))
        make_face()
        with Locations(Location((76, 30.5, 0), (0, 0, 180))):
            Circle(SKETCH15_R, mode=Mode.SUBTRACT)
        with Locations(Location((76, 45.5, 0), (0, 0, 180))):
            Circle(SKETCH15_R_2, mode=Mode.SUBTRACT)
        with Locations(Location((76, 15.5, 0), (0, 0, 180))):
            Circle(SKETCH15_R_2, mode=Mode.SUBTRACT)
        with Locations(Location((91, 30.5, 0), (0, 0, 180))):
            Circle(SKETCH15_R_2, mode=Mode.SUBTRACT)
        with Locations(Location((61, 30.5, 0), (0, 0, 180))):
            Circle(SKETCH15_R_2, mode=Mode.SUBTRACT)
        with Locations(Location((-13, 30.5, 0), (0, 0, 180))):
            Circle(SKETCH15_R_3, mode=Mode.SUBTRACT)
    extrude(amount=BOSS_EXTRUDE9_DEPTH)
    extrude(boss_extrude9_sk.sketch, amount=-BOSS_EXTRUDE9_DEPTH_BACK)

    # Sketch16 → Boss-Extrude10 (add)
    with BuildSketch(Plane.XY.offset(-51)):
        with BuildLine():
            Line((-35.5, 53), (-35.5, 8))
            Line((-35.5, 8), (12.5, 8))
            Line((12.5, 8), (76, 8))
            ThreePointArc((76, 8), (98.5, 30.5), (76, 53))
            Line((76, 53), (-35.5, 53))
        make_face()
        with Locations(Location((76, 45.5, 0), (0, 0, 180))):
            Circle(SKETCH16_R, mode=Mode.SUBTRACT)
        with Locations(Location((91, 30.5, 0), (0, 0, 180))):
            Circle(SKETCH16_R, mode=Mode.SUBTRACT)
        with Locations(Location((76, 15.5, 0), (0, 0, 180))):
            Circle(SKETCH16_R, mode=Mode.SUBTRACT)
        with Locations(Location((76, 30.5, 0), (0, 0, 180))):
            Circle(SKETCH16_R_2, mode=Mode.SUBTRACT)
        with Locations(Location((61, 30.5, 0), (0, 0, 180))):
            Circle(SKETCH16_R, mode=Mode.SUBTRACT)
        with Locations((-13, 30.5)):
            Circle(SKETCH16_R_3, mode=Mode.SUBTRACT)
    extrude(amount=-BOSS_EXTRUDE10_DEPTH)

    # Sketch17 → Boss-Extrude11 (add)
    with BuildSketch(Plane.XY.offset(-51)):
        with BuildLine():
            Line((-28.5, 30.5), (-28.5, 8))
            Line((-28.5, 8), (2.5, 8))
            Line((2.5, 8), (2.5, 30.5))
            ThreePointArc((2.5, 30.5), (-13, 46), (-28.5, 30.5))
        make_face()
        with Locations((-13, 30.5)):
            Circle(SKETCH17_R, mode=Mode.SUBTRACT)
    extrude(amount=BOSS_EXTRUDE11_DEPTH)

    # Sketch20 wall → Rib2 (add, up to next)
    with BuildSketch(Plane(origin=(22.5, 30.5, -31), x_dir=(-0.707106781187, 0, 0.707106781187), z_dir=(0.707106781187, 0, 0.707106781187)), mode=Mode.PRIVATE) as rib2_sk1:
        Rectangle(SKETCH20_WALL_W, SKETCH20_WALL_H)
    rib2_tool1 = extrude(rib2_sk1.sketch, amount=-RIB2_REACH, mode=Mode.PRIVATE) - part.part
    add(rib2_tool1.solids().sort_by_distance((22.5, 30.5, -31))[0])

    # Sketch21 → Boss-Extrude12 (add)
    with BuildSketch(Plane(origin=(0, 0, -56), x_dir=(-1, 0, 0), z_dir=(0, 0, -1))):
        Polygon((-2, -5), (28, -5), (28.5, 2.150333128), (28.5, -2), (38.5, -2), (38.5, 8), (35.5, 8), (-12.5, 8), (-12.5, -2), (-2.5, -2), (-2.5, 2.150333128), align=None)
    extrude(amount=BOSS_EXTRUDE12_DEPTH)

    # Sketch22 → Boss-Extrude13 (add)
    with BuildSketch(Plane.XY.offset(13)):
        with Locations((-13, 30.5)):
            Circle(SKETCH22_R)
        with Locations((-13, 30.5)):
            Circle(SKETCH22_R_2, mode=Mode.SUBTRACT)
    extrude(amount=BOSS_EXTRUDE13_DEPTH)

    # Sketch23 → Cut-Extrude5 (cut)
    with BuildSketch(Plane(origin=(0, 8, 0), x_dir=(1, 0, 0), z_dir=(0, 1, 0))):
        with Locations(Location((7, 46, 0), (0, 0, 270))):
            Circle(SKETCH23_R)
    extrude(amount=CUT_EXTRUDE5_DEPTH, mode=Mode.SUBTRACT)

    # Sketch24 → Cut-Extrude6 (cut)
    with BuildSketch(Plane.ZY.offset(35.5)):
        with Locations((-56, 28)):
            Circle(SKETCH24_R)
        with Locations((-56, 43)):
            Circle(SKETCH24_R)
    extrude(amount=-CUT_EXTRUDE6_DEPTH, mode=Mode.SUBTRACT)

    # Sketch25 → Cut-Extrude7 (cut)
    with BuildSketch(Plane(origin=(0, 53, 0), x_dir=(1, 0, 0), z_dir=(0, 1, 0))):
        with Locations(Location((71, 56, 0), (0, 0, 270))):
            Circle(SKETCH25_R)
        with Locations(Location((21, 56, 0), (0, 0, 270))):
            Circle(SKETCH25_R)
    extrude(amount=-CUT_EXTRUDE7_DEPTH, mode=Mode.SUBTRACT)


solid = part.part
